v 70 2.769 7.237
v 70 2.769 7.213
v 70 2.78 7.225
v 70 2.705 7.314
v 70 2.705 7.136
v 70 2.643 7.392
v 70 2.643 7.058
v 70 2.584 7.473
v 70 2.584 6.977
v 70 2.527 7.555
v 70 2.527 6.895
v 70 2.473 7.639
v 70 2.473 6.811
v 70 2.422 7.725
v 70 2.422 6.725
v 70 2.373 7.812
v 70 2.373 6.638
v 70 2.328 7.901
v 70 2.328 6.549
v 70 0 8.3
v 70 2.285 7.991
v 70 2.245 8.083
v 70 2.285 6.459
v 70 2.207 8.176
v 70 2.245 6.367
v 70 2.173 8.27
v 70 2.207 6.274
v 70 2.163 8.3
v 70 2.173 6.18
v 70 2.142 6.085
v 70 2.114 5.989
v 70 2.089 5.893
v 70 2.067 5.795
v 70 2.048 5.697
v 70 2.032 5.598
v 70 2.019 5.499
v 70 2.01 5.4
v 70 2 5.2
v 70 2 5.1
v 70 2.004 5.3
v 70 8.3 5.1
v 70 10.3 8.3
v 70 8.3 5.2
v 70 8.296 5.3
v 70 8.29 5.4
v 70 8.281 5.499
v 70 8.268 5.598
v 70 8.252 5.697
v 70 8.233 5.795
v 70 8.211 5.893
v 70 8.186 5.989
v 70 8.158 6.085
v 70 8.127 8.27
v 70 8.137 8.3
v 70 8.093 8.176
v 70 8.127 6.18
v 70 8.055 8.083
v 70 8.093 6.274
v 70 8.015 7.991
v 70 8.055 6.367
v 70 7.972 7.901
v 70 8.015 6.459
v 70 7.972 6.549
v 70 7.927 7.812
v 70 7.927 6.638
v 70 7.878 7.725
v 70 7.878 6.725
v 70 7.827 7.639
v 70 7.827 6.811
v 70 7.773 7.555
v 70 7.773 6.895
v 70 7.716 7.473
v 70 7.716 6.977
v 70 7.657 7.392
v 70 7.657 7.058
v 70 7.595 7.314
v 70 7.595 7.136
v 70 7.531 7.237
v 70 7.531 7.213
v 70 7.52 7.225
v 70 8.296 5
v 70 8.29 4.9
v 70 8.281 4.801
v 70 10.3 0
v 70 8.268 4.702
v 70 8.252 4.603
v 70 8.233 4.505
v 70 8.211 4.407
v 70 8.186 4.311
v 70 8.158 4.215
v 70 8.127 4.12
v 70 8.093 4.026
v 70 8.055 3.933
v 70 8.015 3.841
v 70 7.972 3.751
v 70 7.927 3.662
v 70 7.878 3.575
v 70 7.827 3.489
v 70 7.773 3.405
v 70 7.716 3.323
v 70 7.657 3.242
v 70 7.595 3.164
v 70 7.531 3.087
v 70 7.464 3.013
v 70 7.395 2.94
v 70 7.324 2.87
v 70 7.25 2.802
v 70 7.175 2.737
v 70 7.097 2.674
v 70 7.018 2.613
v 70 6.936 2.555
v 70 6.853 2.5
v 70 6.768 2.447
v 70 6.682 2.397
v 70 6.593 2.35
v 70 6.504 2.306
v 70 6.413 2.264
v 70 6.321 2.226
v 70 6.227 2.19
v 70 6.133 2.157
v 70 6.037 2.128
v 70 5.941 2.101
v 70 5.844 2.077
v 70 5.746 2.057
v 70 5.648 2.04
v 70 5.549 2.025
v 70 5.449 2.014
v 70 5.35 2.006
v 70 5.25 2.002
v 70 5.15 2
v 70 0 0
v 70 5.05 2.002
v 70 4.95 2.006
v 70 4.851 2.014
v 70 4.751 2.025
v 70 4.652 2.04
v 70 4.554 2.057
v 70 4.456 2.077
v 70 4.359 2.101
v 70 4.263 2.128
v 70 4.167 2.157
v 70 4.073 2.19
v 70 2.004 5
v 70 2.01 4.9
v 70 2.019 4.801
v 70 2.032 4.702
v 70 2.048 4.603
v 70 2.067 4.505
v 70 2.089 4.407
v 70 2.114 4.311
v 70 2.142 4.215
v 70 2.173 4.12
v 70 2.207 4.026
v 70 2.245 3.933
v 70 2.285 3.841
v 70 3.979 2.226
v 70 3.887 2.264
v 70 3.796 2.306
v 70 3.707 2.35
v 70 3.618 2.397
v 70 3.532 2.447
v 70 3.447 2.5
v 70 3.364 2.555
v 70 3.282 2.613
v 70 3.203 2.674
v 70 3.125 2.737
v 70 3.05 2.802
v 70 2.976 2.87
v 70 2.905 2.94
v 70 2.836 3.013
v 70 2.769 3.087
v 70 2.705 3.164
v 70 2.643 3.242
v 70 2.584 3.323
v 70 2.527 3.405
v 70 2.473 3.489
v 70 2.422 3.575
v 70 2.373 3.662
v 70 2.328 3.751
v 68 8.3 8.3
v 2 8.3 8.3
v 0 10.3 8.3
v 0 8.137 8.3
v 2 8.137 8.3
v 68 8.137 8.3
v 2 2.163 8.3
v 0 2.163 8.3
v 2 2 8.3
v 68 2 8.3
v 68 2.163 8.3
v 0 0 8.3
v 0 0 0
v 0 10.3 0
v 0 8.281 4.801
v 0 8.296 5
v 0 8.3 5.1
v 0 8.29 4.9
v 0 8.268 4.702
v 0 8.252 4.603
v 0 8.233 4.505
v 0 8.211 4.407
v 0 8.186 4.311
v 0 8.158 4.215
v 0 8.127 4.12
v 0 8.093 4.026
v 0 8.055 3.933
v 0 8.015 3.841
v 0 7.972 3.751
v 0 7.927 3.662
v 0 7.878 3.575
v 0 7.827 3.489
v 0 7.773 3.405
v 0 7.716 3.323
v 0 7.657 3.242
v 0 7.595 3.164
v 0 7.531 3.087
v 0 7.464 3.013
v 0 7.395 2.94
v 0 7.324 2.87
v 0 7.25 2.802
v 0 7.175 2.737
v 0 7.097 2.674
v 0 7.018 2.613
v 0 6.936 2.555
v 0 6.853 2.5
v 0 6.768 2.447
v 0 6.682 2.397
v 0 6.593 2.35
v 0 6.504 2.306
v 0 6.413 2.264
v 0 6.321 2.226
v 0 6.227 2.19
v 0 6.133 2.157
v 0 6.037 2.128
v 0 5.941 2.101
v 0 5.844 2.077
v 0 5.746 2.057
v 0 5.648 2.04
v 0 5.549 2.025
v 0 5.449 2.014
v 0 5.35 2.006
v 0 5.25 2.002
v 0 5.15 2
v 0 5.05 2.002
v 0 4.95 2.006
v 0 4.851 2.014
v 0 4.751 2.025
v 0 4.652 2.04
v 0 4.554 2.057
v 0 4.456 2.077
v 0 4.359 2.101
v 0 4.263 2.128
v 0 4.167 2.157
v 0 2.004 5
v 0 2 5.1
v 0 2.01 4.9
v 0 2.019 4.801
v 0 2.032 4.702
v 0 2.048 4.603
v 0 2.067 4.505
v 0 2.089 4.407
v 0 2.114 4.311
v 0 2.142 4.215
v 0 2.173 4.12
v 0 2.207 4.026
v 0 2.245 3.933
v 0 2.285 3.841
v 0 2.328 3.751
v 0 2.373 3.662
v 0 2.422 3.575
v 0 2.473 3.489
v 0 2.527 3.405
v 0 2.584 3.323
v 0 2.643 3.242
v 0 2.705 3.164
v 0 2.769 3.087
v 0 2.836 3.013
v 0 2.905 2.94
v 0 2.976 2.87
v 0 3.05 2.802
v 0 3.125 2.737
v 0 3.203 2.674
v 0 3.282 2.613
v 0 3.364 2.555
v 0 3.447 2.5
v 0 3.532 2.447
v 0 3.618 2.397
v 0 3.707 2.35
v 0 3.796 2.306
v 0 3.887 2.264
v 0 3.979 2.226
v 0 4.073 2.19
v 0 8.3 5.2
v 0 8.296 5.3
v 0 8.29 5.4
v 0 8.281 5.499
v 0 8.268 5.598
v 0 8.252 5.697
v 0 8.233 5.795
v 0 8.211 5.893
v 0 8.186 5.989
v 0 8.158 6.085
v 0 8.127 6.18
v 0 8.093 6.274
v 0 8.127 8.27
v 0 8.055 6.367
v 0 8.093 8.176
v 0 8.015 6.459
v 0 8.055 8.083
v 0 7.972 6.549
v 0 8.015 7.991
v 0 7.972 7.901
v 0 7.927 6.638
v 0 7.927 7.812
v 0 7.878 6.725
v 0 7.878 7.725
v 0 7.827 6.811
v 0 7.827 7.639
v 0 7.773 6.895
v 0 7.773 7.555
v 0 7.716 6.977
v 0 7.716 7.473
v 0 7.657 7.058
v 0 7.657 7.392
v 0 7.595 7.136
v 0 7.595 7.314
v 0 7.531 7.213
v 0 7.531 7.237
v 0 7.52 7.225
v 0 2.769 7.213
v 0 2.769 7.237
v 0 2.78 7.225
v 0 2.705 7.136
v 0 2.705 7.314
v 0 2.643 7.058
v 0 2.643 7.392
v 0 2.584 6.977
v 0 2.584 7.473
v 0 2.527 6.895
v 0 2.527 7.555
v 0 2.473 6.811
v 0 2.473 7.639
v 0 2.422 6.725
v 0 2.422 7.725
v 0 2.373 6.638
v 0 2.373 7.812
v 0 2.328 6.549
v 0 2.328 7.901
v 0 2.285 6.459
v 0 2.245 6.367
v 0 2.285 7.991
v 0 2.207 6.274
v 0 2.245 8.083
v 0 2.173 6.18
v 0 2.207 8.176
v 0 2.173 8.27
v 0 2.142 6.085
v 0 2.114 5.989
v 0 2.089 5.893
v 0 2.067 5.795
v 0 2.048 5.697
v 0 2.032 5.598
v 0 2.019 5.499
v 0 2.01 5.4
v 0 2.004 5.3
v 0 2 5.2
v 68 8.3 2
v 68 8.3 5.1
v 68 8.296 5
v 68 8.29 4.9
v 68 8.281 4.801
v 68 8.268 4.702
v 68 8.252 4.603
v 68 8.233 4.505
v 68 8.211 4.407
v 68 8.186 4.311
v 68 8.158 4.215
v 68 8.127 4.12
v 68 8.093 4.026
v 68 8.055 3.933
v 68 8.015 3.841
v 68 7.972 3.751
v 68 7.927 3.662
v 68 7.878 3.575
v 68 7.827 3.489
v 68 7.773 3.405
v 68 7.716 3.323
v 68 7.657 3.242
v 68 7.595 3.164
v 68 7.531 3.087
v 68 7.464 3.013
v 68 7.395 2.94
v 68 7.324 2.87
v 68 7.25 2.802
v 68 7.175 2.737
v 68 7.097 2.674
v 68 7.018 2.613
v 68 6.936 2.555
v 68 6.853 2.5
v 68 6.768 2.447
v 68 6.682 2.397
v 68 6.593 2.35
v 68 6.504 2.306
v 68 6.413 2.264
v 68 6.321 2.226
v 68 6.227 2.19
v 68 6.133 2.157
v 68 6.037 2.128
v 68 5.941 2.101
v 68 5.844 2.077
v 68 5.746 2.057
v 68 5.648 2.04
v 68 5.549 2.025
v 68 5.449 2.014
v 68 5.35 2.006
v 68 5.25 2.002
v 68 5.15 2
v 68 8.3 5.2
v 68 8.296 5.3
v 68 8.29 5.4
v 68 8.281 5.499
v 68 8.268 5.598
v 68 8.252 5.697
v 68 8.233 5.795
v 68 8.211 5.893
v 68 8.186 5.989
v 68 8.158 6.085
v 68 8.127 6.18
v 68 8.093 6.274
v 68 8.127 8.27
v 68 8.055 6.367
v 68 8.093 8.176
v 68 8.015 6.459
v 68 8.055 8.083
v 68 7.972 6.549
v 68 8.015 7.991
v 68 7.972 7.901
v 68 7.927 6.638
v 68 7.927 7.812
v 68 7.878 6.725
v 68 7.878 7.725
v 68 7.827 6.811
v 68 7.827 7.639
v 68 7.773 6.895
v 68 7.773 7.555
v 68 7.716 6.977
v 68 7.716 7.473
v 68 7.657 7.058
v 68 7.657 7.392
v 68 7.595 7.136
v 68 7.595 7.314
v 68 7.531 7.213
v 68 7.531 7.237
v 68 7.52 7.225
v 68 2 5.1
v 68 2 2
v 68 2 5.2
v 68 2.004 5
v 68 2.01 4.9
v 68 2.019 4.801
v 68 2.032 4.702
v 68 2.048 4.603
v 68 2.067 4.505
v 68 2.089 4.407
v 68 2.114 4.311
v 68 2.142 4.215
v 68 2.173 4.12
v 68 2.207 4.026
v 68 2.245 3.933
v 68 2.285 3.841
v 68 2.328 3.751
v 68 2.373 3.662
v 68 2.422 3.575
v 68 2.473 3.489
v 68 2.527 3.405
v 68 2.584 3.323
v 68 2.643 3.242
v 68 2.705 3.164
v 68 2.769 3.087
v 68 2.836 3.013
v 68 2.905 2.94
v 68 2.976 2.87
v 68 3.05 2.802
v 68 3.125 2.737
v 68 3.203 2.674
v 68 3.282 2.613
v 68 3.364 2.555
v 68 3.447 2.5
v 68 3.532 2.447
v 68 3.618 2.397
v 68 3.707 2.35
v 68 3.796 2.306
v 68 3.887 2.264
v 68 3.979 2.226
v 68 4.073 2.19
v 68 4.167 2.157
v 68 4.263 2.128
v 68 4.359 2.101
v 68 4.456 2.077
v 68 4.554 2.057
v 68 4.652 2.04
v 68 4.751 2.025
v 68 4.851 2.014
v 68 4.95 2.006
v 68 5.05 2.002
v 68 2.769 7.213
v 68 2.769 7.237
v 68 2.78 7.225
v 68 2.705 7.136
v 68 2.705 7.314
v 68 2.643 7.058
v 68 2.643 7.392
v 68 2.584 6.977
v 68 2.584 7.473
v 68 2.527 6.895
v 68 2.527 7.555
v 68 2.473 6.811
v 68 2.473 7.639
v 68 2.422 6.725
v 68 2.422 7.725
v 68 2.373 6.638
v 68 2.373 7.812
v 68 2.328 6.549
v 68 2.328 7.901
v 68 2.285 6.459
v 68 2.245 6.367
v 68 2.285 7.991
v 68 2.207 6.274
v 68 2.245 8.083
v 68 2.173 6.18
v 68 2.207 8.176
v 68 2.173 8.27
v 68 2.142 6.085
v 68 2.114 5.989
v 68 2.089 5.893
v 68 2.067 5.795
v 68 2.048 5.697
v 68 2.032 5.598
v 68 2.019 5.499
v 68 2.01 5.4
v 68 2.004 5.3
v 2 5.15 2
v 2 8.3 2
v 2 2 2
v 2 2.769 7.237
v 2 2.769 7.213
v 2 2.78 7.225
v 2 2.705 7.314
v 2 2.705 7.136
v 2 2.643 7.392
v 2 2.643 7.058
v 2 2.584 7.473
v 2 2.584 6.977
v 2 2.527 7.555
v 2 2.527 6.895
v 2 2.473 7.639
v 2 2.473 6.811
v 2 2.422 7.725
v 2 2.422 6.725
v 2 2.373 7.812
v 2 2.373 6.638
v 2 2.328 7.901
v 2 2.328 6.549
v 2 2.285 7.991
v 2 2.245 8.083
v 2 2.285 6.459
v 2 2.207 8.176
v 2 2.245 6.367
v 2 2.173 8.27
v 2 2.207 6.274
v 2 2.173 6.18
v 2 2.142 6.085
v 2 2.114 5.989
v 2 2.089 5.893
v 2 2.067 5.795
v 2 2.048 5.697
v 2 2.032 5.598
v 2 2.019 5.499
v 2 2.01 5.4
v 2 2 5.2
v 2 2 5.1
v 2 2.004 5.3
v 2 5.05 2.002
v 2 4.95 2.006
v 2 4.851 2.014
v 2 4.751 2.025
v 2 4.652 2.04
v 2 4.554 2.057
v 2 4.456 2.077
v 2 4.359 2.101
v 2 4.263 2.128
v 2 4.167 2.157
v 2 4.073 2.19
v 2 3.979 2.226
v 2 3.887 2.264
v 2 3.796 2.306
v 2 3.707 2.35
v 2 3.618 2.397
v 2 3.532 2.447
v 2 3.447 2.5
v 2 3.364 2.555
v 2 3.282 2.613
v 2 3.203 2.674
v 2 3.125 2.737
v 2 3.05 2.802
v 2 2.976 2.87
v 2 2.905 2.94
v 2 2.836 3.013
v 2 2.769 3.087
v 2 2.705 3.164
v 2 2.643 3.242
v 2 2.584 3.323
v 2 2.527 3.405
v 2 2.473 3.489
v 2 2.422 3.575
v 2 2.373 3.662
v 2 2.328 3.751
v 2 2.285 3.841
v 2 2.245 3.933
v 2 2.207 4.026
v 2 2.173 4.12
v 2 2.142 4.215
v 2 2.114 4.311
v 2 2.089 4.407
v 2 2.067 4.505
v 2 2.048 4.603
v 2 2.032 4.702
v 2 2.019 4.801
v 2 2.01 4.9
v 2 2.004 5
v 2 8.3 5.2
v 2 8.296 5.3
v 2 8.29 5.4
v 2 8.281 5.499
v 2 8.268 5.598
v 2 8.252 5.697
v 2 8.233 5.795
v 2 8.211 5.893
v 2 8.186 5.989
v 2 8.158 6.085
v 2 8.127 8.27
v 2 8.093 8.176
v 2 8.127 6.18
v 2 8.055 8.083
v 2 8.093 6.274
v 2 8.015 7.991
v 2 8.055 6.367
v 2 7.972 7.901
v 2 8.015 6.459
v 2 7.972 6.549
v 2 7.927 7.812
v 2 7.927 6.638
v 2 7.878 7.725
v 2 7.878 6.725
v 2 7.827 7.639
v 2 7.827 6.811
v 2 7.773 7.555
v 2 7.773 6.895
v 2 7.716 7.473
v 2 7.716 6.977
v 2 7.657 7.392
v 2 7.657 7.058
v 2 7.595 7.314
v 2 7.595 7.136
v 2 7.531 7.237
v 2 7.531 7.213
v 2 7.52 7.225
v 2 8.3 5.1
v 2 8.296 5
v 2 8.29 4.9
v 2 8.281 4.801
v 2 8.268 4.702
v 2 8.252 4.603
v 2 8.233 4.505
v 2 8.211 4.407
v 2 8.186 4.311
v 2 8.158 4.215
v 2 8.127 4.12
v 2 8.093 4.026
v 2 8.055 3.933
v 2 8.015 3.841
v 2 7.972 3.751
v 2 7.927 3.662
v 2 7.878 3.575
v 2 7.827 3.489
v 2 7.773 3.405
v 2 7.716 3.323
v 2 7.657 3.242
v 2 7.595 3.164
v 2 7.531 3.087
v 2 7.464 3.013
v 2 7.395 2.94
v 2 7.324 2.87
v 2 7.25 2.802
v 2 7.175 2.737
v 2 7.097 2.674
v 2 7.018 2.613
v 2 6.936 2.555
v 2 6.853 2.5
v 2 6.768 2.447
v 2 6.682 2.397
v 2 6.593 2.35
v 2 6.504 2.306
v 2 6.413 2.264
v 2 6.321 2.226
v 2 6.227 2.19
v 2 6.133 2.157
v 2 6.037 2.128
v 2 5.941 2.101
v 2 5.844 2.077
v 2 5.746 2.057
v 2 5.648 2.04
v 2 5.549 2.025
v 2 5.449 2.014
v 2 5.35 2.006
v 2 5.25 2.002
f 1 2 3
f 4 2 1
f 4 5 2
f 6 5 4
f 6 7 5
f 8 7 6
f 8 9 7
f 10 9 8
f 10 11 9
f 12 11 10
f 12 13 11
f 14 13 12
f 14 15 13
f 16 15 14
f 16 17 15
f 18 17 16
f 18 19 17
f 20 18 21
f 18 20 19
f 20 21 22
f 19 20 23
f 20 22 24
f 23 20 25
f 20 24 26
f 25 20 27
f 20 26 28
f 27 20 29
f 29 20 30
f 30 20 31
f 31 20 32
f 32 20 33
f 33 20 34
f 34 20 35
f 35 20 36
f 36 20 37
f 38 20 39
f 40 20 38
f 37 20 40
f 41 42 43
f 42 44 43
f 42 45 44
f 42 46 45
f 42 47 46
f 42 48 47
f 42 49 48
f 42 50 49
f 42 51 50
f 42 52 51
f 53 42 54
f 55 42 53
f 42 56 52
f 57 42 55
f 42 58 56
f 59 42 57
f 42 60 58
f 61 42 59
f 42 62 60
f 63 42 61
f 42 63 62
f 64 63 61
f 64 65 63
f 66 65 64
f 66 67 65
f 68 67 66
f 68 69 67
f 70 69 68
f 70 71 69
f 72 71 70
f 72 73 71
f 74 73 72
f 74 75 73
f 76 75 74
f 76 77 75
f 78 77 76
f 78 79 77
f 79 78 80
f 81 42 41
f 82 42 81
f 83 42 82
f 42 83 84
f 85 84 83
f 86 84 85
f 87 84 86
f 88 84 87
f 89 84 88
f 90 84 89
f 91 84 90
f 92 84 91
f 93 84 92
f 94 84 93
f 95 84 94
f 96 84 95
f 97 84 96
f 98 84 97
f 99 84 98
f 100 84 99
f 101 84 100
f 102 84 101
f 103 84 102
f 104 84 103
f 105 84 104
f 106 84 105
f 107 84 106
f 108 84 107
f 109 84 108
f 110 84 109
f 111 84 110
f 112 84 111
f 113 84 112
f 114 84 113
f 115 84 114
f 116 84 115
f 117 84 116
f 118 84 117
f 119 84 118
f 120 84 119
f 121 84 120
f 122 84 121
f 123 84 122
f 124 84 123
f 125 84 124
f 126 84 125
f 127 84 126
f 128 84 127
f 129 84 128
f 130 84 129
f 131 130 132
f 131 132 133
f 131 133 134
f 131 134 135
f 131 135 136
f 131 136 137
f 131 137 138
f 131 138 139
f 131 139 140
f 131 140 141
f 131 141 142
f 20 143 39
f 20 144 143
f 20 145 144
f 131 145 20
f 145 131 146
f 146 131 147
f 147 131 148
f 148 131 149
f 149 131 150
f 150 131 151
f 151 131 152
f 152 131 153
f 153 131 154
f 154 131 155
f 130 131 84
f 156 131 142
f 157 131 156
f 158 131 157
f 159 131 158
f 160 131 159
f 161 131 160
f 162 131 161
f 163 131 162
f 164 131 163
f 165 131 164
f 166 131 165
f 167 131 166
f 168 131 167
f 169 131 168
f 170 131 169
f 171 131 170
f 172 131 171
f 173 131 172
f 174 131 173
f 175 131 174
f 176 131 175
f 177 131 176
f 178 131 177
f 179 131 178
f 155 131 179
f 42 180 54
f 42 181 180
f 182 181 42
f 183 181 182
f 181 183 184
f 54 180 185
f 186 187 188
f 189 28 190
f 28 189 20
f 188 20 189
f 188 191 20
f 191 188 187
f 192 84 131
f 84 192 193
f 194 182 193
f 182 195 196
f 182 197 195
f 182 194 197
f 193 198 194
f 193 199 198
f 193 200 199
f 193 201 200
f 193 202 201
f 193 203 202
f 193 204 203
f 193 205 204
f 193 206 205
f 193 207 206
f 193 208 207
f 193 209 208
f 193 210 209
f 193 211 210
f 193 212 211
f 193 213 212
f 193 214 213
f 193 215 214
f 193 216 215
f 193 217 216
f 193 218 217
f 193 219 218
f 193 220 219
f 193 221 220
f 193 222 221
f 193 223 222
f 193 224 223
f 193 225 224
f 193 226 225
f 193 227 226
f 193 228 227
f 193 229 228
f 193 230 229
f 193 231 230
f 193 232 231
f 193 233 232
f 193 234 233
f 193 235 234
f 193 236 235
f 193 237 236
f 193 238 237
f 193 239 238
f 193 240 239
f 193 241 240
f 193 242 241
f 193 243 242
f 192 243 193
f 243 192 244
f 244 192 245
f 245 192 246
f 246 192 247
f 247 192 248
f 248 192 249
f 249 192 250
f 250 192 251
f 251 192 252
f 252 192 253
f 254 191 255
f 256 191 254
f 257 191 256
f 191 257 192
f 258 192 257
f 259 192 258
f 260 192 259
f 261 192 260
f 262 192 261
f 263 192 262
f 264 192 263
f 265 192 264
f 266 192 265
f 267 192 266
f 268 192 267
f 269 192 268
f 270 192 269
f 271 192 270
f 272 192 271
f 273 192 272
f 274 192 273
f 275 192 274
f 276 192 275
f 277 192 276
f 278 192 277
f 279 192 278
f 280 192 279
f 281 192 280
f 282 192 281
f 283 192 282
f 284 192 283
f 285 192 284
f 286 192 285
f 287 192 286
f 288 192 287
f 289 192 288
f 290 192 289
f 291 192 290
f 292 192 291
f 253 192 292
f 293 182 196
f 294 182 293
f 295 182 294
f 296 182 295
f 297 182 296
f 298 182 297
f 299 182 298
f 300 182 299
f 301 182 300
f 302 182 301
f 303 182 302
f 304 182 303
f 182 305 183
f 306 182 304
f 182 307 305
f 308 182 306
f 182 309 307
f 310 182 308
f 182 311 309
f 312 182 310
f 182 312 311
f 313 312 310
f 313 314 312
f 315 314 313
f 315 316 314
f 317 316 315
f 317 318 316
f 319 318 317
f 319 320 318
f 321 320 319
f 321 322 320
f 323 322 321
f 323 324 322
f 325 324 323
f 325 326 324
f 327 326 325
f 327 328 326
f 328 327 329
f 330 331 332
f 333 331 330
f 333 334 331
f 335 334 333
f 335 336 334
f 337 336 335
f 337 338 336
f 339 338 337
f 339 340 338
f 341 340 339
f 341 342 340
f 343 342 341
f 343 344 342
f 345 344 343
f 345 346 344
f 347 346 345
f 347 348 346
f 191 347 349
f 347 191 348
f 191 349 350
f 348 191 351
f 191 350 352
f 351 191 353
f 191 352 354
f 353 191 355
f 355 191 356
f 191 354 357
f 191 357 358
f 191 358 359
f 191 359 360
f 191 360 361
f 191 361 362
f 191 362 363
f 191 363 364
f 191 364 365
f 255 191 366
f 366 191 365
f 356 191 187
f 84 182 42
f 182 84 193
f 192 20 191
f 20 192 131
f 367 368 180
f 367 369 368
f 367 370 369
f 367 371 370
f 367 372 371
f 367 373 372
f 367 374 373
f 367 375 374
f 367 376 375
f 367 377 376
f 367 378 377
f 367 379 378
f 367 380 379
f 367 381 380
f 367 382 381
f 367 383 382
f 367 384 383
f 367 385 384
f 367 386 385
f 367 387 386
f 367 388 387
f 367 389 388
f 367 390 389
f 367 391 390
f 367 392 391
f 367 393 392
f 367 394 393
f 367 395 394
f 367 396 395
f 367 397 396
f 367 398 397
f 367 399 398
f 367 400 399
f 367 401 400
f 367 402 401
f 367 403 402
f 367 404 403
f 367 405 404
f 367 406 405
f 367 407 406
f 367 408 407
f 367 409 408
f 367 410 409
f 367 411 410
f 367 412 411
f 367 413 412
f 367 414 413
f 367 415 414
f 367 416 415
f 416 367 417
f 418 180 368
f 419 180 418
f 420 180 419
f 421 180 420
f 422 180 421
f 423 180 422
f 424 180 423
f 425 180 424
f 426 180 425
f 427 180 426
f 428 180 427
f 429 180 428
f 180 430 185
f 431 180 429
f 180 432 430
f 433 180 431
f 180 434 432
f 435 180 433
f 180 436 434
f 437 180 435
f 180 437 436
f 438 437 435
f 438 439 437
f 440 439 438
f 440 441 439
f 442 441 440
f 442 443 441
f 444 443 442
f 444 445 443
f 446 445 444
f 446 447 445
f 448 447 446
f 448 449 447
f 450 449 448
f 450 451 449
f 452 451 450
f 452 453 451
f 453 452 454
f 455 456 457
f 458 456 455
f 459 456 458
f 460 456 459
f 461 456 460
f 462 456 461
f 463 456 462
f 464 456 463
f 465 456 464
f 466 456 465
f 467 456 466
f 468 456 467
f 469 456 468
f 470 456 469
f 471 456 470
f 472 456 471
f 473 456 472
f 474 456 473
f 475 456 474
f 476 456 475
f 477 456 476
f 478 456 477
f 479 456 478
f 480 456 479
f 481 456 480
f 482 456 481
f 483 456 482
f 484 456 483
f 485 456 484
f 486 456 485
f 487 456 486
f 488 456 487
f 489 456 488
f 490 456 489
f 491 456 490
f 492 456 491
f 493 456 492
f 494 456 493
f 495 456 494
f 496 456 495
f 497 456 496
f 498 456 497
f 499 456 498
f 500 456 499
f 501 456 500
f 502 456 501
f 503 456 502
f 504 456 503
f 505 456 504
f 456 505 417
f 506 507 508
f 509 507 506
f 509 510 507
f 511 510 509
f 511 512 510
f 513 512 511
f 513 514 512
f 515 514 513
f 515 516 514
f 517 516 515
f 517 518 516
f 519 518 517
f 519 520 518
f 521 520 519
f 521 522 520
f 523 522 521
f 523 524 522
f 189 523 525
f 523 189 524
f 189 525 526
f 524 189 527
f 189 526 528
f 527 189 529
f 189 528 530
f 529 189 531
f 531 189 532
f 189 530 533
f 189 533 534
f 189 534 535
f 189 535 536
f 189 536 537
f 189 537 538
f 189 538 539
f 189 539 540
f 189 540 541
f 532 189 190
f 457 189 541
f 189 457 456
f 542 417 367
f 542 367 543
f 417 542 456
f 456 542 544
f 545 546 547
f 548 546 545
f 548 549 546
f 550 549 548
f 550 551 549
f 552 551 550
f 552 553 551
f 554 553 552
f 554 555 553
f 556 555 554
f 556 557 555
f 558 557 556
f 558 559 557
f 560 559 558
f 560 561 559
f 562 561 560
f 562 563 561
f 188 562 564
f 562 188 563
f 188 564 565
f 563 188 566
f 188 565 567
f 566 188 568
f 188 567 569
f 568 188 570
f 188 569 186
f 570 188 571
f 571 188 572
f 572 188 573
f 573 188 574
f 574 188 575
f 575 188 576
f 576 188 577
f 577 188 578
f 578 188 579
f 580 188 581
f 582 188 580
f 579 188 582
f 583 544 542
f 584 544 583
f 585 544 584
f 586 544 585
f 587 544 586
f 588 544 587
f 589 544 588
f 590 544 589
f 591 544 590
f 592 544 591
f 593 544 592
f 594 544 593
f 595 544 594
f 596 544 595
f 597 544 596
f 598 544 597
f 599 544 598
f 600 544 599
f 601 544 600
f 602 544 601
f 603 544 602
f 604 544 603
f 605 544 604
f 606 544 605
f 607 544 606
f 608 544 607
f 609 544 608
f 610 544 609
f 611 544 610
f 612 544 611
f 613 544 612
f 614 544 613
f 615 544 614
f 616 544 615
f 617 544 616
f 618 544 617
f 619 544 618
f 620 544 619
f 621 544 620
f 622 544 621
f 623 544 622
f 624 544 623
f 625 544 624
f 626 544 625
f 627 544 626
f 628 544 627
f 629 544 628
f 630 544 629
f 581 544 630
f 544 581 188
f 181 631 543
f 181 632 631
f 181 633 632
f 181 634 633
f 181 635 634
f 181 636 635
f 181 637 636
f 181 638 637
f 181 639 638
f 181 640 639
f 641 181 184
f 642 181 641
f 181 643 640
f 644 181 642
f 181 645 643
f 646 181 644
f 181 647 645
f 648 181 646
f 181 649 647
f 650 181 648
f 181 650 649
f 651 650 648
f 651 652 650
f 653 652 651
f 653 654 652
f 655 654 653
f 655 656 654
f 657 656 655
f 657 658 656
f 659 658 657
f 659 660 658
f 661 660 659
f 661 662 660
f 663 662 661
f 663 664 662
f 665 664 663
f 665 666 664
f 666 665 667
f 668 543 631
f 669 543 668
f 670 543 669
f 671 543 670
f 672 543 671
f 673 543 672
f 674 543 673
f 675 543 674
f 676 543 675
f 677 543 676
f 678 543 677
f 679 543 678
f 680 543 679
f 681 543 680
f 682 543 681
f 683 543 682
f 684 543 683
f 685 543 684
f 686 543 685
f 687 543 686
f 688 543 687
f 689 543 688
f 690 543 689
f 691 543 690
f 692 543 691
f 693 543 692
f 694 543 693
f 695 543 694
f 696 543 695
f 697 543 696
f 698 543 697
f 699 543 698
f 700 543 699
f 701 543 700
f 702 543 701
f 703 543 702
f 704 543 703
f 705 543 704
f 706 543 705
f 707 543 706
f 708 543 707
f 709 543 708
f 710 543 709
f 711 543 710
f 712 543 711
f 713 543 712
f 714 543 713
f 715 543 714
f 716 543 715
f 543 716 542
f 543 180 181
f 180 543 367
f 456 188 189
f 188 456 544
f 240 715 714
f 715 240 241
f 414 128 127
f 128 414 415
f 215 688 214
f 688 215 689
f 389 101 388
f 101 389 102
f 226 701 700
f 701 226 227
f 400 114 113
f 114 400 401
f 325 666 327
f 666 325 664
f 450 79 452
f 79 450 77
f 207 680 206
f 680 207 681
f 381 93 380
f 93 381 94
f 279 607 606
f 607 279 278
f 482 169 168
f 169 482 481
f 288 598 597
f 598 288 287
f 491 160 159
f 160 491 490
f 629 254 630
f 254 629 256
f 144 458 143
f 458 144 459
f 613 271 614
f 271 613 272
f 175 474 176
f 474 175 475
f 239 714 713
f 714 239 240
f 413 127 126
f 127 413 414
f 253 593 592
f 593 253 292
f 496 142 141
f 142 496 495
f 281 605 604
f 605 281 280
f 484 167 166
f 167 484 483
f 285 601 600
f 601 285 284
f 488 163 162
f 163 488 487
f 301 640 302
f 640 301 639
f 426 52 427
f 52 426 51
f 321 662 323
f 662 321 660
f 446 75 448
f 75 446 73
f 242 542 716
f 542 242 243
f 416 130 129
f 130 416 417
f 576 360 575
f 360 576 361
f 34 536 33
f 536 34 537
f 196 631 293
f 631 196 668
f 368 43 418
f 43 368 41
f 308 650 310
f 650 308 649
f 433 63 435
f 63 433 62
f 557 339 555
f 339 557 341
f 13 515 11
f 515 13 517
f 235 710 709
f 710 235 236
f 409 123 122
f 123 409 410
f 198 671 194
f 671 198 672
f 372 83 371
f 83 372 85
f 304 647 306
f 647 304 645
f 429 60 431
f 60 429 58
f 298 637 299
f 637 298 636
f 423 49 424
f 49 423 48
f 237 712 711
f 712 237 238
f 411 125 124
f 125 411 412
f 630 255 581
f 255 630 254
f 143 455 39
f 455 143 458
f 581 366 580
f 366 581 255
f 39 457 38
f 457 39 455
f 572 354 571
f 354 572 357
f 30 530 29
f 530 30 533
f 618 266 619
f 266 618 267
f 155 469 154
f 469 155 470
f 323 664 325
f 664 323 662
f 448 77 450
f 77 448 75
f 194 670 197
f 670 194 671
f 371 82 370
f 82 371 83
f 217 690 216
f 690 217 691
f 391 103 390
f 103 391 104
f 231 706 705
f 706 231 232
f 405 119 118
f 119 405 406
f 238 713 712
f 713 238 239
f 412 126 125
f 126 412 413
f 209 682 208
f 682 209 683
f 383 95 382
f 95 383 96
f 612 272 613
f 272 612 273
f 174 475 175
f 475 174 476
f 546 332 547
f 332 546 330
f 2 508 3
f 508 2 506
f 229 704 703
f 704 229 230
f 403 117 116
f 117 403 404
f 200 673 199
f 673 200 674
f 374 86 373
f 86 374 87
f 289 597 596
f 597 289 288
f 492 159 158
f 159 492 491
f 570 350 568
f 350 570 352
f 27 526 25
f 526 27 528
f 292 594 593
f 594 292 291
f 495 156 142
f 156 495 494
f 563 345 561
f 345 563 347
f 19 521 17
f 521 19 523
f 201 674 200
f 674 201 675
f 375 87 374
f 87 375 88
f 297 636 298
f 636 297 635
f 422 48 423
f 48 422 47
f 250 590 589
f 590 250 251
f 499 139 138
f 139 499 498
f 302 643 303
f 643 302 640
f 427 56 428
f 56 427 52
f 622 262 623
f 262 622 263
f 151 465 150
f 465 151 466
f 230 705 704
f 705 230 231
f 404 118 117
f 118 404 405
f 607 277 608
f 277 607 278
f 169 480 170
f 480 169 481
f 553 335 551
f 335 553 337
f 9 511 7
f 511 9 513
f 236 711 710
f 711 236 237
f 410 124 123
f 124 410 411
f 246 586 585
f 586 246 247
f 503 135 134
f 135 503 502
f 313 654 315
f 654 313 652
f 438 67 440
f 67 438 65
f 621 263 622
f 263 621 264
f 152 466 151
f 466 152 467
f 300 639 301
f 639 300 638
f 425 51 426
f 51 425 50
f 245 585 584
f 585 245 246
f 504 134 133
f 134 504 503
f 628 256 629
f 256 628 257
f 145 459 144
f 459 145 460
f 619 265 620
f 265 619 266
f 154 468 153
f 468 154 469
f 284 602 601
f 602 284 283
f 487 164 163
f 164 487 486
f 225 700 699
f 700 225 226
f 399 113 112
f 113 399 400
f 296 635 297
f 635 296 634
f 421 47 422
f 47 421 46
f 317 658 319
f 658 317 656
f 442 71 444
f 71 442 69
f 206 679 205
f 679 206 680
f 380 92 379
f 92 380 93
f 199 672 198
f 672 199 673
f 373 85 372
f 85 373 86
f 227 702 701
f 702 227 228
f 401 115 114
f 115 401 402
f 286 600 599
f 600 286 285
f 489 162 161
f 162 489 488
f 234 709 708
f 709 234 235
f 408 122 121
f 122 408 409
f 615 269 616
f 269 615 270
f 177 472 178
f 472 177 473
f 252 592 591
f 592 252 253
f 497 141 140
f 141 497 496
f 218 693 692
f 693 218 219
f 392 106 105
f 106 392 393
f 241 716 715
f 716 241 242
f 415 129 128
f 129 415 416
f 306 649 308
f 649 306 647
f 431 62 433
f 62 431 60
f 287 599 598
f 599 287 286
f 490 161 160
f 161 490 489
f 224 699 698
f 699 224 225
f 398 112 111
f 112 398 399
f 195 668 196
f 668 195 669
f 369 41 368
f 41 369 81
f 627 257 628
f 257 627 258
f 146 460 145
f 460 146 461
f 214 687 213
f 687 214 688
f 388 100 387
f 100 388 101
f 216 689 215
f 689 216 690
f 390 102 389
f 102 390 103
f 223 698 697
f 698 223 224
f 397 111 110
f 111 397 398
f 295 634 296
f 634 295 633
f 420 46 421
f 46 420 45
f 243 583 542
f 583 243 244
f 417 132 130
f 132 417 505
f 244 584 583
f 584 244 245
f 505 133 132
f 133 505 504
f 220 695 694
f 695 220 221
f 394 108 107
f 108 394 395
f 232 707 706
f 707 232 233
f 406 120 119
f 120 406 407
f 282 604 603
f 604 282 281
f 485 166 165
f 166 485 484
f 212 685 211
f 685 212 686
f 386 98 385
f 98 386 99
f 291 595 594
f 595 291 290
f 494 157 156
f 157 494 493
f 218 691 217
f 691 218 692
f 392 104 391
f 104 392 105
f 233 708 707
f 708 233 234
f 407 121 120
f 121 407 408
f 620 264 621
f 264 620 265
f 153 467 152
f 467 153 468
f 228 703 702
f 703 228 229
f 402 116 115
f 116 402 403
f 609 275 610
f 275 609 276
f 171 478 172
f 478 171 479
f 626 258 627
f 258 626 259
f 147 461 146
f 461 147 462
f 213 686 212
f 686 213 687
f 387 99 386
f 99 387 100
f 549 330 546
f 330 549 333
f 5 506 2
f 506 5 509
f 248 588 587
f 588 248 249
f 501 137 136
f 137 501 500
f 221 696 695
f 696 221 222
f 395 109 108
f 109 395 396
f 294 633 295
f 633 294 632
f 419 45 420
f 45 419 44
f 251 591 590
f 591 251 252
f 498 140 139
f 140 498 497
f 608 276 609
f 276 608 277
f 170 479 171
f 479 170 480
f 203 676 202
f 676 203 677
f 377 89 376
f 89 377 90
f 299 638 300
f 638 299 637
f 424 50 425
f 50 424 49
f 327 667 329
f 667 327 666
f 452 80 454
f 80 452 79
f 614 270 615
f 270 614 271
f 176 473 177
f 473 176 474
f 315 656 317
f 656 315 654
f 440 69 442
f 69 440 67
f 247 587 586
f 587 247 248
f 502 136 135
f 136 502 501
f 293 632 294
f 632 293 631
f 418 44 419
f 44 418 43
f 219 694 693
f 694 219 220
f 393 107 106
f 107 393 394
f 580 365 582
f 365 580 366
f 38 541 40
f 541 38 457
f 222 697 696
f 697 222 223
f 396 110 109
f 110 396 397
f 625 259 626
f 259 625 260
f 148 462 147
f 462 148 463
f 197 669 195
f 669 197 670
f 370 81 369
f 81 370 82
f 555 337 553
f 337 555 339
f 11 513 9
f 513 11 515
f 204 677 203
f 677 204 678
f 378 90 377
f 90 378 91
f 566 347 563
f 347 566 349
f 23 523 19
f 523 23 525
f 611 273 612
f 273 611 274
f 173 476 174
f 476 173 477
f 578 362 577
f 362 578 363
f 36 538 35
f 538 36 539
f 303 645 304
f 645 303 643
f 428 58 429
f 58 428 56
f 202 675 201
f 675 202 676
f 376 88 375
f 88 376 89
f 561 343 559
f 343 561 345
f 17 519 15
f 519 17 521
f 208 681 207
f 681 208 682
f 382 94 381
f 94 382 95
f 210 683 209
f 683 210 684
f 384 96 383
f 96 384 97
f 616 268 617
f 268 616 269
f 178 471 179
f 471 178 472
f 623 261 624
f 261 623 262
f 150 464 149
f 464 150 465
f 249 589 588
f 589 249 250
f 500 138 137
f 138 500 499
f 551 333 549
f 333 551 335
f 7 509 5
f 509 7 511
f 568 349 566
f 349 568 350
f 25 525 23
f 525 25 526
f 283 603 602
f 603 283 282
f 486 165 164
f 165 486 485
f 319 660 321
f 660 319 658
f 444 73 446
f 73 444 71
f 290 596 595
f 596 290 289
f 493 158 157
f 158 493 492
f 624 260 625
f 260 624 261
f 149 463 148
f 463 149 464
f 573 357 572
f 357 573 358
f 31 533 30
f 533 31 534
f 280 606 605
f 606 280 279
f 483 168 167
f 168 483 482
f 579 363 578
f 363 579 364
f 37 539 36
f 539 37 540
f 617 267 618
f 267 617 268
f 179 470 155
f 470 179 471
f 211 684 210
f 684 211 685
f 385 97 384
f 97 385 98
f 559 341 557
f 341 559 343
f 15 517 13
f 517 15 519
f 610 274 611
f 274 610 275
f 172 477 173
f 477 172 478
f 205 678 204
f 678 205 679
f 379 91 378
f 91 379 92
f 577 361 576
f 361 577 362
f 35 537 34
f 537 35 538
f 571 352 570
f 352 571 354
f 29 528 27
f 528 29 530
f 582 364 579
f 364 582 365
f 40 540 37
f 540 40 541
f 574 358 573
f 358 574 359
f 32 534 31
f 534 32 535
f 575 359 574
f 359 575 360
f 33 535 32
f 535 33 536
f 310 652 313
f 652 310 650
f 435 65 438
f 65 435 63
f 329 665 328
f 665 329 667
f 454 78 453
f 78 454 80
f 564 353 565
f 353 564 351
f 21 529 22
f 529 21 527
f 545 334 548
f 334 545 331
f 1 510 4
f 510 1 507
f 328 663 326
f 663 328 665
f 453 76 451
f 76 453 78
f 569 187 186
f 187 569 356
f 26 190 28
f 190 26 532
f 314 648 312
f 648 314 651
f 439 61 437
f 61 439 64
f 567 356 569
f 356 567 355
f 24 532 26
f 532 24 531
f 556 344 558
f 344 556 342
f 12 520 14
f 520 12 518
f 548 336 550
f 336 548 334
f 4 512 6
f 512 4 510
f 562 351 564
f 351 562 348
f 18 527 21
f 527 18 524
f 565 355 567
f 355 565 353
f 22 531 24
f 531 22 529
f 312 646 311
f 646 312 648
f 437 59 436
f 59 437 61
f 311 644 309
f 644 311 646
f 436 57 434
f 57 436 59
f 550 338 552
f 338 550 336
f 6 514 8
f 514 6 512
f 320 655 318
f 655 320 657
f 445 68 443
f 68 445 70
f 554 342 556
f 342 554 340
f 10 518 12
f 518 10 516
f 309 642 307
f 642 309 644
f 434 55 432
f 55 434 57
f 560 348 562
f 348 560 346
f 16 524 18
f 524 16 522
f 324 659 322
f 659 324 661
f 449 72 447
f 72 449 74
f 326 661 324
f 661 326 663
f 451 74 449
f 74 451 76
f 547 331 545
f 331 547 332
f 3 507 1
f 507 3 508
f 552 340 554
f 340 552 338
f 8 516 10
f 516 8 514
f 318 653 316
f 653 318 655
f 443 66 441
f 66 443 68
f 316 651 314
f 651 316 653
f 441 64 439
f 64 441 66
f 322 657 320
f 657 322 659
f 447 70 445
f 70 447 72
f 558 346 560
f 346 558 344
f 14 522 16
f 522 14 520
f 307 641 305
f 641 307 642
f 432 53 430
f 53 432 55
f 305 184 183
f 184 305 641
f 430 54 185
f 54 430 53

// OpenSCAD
// [FL_INDEX: keywords="openscad, 3d_parametric, PVC_Gate_Valve_Support, csg_solid" | COT="Parametric OpenSCAD design from 3DCodeverse"]
// Title: PVC Gate Valve Support

// Stem Diameter
d = 6.3;
// Support Length
l = 70;
// Support Thickness
t = 2;

$fa = 0.1;
$fs = 0.1;

difference() {
	cube([l, d + (2 * t), d + t]);
	translate([t, t, t])
	cube([l - (2 * t), d, d + 0.1]);
	rotate([0, 90, 0])
	translate([-t - (d / 2), t + (d / 2), -0.1])
	cylinder(r = d / 2, h = l + 0.2);
	rotate([0, 90, 0])
	translate([-t - d - 1, t + (d / 2), -0.1])
	cylinder(r = d / 2, h = l + 0.2);
}
